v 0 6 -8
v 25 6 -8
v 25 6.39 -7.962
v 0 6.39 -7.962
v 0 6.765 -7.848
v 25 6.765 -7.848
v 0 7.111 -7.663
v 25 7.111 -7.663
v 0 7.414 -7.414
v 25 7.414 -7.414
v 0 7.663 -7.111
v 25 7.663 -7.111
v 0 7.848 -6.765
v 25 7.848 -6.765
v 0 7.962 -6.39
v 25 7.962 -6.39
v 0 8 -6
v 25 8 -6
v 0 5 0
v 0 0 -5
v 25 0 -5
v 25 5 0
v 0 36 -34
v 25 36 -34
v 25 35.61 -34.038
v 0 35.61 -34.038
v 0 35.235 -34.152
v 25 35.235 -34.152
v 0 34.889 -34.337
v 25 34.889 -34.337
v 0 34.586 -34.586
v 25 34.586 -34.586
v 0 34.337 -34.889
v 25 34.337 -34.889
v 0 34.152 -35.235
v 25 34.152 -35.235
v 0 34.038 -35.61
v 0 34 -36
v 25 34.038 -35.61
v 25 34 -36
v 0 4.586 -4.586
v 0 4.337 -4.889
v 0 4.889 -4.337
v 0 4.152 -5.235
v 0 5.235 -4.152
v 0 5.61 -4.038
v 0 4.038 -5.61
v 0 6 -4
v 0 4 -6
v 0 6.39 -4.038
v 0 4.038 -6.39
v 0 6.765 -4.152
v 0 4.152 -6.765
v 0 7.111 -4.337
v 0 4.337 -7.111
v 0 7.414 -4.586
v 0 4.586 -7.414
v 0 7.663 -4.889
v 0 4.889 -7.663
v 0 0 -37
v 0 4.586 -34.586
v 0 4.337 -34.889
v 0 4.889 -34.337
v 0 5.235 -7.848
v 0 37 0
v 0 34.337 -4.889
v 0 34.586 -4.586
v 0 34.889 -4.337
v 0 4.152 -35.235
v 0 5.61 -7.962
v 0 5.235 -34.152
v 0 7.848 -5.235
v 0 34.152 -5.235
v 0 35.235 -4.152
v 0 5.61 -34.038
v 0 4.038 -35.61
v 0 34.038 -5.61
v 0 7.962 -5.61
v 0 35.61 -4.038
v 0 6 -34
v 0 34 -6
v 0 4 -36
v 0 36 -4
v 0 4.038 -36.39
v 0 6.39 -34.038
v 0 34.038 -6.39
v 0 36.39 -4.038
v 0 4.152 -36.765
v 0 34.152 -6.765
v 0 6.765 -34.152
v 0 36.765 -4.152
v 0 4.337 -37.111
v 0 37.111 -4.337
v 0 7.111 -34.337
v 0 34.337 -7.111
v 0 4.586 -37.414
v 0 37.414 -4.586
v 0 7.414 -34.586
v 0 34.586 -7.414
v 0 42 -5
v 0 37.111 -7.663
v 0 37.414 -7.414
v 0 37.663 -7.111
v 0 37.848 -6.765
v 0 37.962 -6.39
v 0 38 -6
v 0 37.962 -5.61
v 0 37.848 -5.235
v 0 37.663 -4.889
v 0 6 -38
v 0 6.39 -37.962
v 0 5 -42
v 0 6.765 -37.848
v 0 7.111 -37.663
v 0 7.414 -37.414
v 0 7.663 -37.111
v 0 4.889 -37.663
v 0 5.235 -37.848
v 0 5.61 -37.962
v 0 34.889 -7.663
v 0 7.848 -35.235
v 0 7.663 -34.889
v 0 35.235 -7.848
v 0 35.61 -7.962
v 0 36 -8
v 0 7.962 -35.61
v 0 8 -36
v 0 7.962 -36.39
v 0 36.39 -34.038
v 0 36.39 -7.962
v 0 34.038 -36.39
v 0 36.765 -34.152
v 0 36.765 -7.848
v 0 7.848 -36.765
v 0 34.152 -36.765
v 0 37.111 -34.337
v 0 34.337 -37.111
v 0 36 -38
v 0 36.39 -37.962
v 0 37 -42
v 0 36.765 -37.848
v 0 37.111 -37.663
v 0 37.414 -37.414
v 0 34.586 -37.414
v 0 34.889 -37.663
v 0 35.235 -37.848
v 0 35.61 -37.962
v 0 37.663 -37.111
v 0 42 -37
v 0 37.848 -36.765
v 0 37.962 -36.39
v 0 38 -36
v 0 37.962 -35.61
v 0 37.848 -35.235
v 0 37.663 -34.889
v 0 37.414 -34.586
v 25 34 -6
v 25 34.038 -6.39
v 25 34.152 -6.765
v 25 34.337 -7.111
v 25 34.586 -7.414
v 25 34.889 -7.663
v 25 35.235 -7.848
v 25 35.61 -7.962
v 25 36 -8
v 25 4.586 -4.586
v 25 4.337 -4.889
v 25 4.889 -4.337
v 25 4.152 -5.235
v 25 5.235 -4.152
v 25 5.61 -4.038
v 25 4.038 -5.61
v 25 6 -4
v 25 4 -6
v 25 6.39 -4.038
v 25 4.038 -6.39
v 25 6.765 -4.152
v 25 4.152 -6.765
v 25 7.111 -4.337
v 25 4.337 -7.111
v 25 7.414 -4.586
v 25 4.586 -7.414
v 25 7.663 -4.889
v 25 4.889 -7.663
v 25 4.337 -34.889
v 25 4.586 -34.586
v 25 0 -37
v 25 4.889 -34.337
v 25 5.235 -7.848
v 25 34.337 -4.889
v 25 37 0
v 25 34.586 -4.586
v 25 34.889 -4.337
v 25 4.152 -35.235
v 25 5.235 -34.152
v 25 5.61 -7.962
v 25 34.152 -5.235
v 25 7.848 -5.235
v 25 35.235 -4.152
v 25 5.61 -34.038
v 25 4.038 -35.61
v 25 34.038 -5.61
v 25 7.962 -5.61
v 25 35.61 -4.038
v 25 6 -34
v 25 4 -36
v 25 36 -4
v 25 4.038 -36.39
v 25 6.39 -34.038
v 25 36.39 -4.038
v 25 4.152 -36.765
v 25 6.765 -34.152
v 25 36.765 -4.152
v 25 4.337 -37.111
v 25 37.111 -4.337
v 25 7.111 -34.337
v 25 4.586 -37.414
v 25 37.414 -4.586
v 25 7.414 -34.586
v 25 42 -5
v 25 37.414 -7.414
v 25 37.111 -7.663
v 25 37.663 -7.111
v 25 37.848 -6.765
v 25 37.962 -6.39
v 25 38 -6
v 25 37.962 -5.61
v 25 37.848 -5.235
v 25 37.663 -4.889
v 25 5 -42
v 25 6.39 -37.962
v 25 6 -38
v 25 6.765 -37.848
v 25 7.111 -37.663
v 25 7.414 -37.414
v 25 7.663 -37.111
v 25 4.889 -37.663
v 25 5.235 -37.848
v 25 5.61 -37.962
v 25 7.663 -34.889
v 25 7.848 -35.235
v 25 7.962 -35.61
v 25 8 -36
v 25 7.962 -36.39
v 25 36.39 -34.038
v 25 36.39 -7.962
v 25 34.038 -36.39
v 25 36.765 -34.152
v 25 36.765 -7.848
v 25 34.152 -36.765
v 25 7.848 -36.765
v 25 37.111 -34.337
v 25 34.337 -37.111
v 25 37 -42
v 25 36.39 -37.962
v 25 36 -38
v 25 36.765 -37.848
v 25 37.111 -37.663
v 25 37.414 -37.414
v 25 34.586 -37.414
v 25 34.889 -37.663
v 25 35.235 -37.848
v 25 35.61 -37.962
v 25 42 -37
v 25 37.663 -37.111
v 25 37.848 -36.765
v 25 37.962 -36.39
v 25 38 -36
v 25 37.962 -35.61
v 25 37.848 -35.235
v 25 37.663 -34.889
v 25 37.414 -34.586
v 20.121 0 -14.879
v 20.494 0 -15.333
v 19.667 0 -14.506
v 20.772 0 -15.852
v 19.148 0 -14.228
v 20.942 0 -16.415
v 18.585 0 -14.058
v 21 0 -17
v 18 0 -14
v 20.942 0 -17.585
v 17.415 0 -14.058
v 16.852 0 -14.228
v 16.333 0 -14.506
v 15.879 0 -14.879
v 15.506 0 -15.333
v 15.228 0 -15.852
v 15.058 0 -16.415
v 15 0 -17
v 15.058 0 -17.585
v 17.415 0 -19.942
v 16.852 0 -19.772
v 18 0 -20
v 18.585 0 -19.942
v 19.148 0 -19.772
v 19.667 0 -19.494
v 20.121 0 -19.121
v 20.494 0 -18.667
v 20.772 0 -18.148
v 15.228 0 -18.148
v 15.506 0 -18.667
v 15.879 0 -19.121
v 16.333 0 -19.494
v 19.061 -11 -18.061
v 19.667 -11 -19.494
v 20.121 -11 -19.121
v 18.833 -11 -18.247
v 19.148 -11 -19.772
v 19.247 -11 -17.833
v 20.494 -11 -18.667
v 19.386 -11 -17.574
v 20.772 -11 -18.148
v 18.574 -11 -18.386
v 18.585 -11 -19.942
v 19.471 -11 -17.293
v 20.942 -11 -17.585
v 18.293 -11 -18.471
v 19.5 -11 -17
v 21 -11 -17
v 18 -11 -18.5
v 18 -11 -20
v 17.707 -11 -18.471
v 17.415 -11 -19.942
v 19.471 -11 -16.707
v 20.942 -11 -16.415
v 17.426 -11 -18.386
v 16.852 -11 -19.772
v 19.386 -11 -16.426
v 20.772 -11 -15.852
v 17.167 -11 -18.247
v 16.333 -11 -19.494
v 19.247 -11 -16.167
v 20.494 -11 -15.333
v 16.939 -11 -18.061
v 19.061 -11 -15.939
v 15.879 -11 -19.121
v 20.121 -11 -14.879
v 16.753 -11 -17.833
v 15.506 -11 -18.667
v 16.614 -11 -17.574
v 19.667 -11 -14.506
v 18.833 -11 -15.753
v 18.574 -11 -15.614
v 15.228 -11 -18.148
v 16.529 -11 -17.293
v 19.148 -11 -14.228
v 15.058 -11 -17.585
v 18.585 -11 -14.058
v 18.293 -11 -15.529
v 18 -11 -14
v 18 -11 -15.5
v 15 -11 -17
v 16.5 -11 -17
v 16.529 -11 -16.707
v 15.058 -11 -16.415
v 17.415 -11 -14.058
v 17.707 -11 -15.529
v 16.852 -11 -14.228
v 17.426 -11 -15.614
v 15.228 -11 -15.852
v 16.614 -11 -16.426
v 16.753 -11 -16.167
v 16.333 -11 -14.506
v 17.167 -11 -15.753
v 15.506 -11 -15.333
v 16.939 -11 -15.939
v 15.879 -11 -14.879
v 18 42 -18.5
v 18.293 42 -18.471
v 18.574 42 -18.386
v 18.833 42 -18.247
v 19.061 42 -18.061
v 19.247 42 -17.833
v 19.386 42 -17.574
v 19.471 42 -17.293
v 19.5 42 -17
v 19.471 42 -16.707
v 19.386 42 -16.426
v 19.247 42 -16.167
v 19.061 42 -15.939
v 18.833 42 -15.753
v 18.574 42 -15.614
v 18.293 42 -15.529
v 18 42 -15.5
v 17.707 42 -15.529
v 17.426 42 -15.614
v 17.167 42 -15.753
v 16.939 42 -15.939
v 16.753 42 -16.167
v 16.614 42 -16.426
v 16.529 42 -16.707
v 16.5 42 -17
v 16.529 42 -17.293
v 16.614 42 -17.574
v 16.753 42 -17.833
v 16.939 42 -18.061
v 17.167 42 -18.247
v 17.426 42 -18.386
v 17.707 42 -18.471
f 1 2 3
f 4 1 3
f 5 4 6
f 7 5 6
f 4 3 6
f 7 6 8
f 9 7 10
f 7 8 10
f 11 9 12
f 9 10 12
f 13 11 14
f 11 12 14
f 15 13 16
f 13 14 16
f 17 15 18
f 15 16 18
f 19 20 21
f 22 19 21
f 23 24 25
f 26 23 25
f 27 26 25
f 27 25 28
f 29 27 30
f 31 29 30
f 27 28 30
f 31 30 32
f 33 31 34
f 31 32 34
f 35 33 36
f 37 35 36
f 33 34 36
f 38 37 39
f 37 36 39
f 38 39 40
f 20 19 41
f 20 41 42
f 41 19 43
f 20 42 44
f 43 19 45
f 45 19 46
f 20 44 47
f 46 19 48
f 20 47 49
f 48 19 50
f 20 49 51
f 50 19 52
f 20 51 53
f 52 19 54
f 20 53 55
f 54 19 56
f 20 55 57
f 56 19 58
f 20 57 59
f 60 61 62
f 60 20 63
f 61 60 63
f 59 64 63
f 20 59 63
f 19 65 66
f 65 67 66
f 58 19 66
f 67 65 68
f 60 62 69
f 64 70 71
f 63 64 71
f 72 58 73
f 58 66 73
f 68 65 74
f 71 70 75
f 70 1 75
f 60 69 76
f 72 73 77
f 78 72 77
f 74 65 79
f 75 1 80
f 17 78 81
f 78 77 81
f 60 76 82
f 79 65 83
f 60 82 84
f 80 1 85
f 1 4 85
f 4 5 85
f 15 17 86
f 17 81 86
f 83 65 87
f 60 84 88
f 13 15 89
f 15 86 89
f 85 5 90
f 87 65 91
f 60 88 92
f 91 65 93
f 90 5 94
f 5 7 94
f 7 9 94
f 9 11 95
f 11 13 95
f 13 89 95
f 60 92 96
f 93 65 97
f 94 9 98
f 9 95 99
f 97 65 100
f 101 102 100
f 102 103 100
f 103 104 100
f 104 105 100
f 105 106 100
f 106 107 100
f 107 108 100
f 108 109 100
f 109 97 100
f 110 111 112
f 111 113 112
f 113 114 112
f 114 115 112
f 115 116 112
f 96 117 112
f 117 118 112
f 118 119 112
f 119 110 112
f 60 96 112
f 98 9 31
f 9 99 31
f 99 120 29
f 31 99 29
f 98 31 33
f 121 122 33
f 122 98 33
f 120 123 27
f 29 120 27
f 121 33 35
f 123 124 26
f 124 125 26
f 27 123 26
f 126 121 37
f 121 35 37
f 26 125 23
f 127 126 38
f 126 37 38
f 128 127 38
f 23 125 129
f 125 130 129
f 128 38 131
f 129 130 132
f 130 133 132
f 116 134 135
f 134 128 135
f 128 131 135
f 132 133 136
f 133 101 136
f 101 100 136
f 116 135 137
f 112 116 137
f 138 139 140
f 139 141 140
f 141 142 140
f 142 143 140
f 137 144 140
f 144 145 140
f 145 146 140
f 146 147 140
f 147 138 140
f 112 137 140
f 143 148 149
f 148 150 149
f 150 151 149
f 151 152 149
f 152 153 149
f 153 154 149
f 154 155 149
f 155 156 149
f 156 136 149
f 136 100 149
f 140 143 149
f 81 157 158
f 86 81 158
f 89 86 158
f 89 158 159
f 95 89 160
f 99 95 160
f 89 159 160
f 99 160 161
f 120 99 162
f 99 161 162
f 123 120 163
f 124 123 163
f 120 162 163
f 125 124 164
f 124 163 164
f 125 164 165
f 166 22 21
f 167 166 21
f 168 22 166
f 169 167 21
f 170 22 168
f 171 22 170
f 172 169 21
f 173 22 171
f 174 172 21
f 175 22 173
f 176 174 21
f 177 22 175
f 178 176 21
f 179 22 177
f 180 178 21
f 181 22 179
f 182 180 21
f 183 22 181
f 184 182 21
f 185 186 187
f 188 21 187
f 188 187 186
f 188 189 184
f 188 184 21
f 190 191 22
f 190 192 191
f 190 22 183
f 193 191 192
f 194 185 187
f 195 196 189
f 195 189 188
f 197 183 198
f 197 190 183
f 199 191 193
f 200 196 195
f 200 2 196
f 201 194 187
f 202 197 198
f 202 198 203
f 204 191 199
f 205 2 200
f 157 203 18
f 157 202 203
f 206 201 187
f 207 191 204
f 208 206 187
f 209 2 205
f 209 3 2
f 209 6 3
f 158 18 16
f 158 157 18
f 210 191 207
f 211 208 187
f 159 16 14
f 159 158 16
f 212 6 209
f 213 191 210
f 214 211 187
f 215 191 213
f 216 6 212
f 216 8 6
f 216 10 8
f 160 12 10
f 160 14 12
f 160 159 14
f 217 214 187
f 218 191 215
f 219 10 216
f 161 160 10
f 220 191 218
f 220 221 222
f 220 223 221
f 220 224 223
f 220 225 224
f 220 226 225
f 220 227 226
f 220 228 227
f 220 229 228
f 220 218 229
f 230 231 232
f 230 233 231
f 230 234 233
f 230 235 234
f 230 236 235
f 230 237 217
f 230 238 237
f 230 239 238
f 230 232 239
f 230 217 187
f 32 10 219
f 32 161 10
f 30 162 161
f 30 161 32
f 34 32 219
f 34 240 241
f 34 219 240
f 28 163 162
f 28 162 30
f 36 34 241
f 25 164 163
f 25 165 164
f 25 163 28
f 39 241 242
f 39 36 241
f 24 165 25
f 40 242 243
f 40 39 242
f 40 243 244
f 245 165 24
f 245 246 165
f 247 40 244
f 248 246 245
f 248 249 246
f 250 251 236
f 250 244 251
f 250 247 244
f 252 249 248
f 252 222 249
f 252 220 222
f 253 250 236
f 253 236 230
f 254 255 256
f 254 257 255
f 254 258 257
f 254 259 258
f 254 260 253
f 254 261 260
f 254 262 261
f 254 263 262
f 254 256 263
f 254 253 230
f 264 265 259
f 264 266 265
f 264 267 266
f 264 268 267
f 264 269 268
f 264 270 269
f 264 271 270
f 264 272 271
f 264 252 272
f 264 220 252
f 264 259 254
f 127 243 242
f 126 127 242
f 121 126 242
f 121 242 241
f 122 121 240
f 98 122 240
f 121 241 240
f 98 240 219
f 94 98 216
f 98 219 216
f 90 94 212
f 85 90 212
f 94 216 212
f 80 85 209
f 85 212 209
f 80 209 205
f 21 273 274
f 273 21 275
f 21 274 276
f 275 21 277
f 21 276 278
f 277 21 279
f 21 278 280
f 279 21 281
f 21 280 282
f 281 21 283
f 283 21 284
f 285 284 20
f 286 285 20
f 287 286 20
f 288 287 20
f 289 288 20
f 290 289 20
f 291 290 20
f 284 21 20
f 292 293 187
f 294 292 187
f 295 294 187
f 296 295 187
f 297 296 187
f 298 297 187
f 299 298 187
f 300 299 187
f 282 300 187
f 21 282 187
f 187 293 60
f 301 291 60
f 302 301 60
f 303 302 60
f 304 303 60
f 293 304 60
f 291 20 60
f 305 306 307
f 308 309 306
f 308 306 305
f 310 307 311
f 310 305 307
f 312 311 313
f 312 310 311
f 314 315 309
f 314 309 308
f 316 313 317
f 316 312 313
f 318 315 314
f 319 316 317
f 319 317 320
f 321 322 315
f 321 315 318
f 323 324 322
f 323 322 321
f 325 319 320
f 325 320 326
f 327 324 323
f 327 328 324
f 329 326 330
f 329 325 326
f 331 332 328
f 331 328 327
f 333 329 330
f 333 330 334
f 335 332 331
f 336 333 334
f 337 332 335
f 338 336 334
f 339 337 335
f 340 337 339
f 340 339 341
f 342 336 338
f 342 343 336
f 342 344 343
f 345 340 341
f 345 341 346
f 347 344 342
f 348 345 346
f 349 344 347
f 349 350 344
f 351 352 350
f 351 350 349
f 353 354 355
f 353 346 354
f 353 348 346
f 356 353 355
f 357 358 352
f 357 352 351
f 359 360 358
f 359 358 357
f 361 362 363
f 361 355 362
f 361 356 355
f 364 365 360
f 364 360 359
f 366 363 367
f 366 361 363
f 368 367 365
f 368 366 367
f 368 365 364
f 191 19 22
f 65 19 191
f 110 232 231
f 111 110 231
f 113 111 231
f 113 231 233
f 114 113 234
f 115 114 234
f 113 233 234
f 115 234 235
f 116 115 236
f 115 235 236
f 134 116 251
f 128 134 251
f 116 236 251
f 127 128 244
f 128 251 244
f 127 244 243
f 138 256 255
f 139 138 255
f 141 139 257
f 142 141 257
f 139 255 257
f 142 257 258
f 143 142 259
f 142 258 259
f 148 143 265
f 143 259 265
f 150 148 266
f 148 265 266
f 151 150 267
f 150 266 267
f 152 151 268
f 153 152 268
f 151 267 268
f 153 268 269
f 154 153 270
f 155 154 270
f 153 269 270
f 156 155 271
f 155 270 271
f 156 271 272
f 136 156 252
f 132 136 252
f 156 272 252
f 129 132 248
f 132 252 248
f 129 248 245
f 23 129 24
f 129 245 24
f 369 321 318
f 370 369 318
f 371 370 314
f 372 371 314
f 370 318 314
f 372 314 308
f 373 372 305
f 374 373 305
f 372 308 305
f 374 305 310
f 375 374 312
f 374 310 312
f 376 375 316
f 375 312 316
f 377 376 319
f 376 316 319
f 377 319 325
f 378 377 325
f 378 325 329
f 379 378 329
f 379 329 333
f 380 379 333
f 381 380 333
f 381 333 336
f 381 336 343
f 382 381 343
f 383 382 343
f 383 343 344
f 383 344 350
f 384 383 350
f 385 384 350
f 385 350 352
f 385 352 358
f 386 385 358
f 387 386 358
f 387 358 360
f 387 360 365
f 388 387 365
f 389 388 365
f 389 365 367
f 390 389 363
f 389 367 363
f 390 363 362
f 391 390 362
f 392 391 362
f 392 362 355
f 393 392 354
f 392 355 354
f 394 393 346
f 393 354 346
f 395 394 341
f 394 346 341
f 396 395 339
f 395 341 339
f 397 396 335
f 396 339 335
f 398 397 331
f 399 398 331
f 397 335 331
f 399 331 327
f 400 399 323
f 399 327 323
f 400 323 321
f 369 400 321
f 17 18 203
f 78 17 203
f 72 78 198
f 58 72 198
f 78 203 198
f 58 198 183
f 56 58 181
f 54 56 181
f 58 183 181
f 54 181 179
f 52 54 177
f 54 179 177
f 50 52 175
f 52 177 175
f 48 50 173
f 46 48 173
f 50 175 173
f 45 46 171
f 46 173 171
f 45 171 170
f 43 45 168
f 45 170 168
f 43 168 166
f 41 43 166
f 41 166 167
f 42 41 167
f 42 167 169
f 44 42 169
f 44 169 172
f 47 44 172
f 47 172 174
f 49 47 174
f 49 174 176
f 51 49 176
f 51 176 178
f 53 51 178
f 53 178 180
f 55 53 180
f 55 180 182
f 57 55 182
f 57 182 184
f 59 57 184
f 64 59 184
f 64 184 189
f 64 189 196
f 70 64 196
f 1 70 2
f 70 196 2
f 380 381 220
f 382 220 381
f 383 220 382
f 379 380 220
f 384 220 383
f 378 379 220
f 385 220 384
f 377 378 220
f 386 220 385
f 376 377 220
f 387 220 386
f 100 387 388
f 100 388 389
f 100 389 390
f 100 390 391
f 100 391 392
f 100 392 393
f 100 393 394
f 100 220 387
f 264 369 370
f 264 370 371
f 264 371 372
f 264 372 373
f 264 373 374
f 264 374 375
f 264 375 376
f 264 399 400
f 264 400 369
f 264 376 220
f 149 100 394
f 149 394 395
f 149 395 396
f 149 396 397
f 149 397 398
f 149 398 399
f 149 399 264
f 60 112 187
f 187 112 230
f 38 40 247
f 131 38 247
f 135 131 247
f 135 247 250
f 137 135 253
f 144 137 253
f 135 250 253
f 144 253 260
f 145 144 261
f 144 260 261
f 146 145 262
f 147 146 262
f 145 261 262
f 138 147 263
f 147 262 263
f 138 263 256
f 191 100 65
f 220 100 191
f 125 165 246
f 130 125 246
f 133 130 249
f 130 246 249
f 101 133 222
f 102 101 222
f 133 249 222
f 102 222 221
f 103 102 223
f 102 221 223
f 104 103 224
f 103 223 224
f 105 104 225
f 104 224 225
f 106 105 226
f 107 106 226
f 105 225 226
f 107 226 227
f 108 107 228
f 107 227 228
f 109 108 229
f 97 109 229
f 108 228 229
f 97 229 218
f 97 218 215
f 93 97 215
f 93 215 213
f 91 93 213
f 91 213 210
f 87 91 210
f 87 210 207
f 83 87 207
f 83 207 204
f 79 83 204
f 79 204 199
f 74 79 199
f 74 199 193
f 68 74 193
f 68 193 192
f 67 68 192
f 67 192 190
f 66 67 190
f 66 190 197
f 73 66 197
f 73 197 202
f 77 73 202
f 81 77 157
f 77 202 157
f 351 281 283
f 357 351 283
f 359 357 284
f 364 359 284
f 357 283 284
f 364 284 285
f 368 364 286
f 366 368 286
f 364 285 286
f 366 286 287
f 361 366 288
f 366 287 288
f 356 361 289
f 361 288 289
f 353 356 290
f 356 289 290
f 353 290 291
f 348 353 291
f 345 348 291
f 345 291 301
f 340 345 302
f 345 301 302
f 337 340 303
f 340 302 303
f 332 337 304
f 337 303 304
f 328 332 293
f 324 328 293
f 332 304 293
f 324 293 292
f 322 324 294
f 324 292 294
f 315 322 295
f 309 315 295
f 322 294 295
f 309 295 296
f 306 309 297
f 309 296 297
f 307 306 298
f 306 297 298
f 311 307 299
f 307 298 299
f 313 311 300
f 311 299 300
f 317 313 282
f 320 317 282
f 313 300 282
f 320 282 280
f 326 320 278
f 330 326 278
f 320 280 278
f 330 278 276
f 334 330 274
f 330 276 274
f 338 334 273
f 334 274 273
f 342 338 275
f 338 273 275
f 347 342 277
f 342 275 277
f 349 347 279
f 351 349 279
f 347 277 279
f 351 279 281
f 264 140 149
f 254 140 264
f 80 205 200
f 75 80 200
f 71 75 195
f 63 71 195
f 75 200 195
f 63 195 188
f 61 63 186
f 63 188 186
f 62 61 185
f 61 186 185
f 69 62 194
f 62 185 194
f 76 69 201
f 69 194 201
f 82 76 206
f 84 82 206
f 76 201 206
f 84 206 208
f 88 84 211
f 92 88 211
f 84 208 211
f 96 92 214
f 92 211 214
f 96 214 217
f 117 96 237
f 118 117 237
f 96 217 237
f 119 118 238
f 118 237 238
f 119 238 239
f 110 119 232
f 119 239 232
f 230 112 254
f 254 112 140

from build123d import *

# Parameters (mm, degrees)
SKETCH1_W           = 42
SKETCH1_H           = 42
BOSS_EXTRUDE1_DEPTH = 25
SKETCH2_R           = 3
BOSS_EXTRUDE2_DEPTH = 11
CUT_EXTRUDE1_DEPTH  = 42
SKETCH4_R           = 1.5
CUT_EXTRUDE2_DEPTH  = 100
CHAMFER2_SIZE       = 5


with BuildPart() as part:
    # Sketch1 → Boss-Extrude1 (new body)
    with BuildSketch(Plane(origin=(0, 0, 0), x_dir=(0, 0, -1), z_dir=(1, 0, 0))):
        with Locations((21, 21)):
            Rectangle(SKETCH1_W, SKETCH1_H)
    extrude(amount=BOSS_EXTRUDE1_DEPTH)

    # Sketch2 → Boss-Extrude2 (add)
    with BuildSketch(Plane.XZ):
        with Locations(Location((18, -17, 0), (0, 0, 90))):
            Circle(SKETCH2_R)
    extrude(amount=BOSS_EXTRUDE2_DEPTH)

    # Sketch3 → Cut-Extrude1 (cut)
    with BuildSketch(Plane(origin=(25, 0, 0), x_dir=(0, 0, -1), z_dir=(1, 0, 0))):
        with BuildLine():
            ThreePointArc((8, 36), (4.585786438, 37.414213562), (6, 34))
            Line((6, 34), (6, 36))
            Line((6, 36), (8, 36))
        make_face()
        with BuildLine():
            Line((6, 36), (6, 34))
            ThreePointArc((6, 34), (7.414213562, 34.585786438), (8, 36))
            Line((8, 36), (6, 36))
        make_face()
        with BuildLine():
            ThreePointArc((34, 36), (34.585786438, 34.585786438), (36, 34))
            Line((36, 34), (36, 36))
            Line((36, 36), (34, 36))
        make_face()
        with BuildLine():
            Line((36, 36), (36, 34))
            ThreePointArc((36, 34), (37.414213562, 34.585786438), (38, 36))
            ThreePointArc((38, 36), (36, 38), (34, 36))
            Line((34, 36), (36, 36))
        make_face()
        with BuildLine():
            Line((6, 8), (6, 6))
            Line((6, 6), (8, 6))
            ThreePointArc((8, 6), (7.414213562, 7.414213562), (6, 8))
        make_face()
        with BuildLine():
            Line((8, 6), (6, 6))
            Line((6, 6), (6, 8))
            ThreePointArc((6, 8), (4.585786438, 4.585786438), (8, 6))
        make_face()
        with BuildLine():
            ThreePointArc((36, 8), (34.585786438, 7.414213562), (34, 6))
            Line((34, 6), (36, 6))
            Line((36, 6), (36, 8))
        make_face()
        with BuildLine():
            Line((36, 6), (34, 6))
            ThreePointArc((34, 6), (36, 4), (38, 6))
            ThreePointArc((38, 6), (37.414213562, 7.414213562), (36, 8))
            Line((36, 8), (36, 6))
        make_face()
    extrude(amount=-CUT_EXTRUDE1_DEPTH, mode=Mode.SUBTRACT)

    # Sketch4 → Cut-Extrude2 (cut)
    with BuildSketch(Plane.XZ.offset(11)):
        with Locations(Location((18, -17, 0), (0, 0, 270))):
            Circle(SKETCH4_R)
    extrude(amount=-CUT_EXTRUDE2_DEPTH, mode=Mode.SUBTRACT)

    # Chamfer2
    chamfer2_edges = [part.edges().sort_by_distance(p)[0] for p in [
        (12.5, 42, 0),
        (12.5, 42, -42),
        (12.5, 0, -42),
        (12.5, 0, 0),
    ]]
    chamfer(chamfer2_edges, length=CHAMFER2_SIZE)


solid = part.part
